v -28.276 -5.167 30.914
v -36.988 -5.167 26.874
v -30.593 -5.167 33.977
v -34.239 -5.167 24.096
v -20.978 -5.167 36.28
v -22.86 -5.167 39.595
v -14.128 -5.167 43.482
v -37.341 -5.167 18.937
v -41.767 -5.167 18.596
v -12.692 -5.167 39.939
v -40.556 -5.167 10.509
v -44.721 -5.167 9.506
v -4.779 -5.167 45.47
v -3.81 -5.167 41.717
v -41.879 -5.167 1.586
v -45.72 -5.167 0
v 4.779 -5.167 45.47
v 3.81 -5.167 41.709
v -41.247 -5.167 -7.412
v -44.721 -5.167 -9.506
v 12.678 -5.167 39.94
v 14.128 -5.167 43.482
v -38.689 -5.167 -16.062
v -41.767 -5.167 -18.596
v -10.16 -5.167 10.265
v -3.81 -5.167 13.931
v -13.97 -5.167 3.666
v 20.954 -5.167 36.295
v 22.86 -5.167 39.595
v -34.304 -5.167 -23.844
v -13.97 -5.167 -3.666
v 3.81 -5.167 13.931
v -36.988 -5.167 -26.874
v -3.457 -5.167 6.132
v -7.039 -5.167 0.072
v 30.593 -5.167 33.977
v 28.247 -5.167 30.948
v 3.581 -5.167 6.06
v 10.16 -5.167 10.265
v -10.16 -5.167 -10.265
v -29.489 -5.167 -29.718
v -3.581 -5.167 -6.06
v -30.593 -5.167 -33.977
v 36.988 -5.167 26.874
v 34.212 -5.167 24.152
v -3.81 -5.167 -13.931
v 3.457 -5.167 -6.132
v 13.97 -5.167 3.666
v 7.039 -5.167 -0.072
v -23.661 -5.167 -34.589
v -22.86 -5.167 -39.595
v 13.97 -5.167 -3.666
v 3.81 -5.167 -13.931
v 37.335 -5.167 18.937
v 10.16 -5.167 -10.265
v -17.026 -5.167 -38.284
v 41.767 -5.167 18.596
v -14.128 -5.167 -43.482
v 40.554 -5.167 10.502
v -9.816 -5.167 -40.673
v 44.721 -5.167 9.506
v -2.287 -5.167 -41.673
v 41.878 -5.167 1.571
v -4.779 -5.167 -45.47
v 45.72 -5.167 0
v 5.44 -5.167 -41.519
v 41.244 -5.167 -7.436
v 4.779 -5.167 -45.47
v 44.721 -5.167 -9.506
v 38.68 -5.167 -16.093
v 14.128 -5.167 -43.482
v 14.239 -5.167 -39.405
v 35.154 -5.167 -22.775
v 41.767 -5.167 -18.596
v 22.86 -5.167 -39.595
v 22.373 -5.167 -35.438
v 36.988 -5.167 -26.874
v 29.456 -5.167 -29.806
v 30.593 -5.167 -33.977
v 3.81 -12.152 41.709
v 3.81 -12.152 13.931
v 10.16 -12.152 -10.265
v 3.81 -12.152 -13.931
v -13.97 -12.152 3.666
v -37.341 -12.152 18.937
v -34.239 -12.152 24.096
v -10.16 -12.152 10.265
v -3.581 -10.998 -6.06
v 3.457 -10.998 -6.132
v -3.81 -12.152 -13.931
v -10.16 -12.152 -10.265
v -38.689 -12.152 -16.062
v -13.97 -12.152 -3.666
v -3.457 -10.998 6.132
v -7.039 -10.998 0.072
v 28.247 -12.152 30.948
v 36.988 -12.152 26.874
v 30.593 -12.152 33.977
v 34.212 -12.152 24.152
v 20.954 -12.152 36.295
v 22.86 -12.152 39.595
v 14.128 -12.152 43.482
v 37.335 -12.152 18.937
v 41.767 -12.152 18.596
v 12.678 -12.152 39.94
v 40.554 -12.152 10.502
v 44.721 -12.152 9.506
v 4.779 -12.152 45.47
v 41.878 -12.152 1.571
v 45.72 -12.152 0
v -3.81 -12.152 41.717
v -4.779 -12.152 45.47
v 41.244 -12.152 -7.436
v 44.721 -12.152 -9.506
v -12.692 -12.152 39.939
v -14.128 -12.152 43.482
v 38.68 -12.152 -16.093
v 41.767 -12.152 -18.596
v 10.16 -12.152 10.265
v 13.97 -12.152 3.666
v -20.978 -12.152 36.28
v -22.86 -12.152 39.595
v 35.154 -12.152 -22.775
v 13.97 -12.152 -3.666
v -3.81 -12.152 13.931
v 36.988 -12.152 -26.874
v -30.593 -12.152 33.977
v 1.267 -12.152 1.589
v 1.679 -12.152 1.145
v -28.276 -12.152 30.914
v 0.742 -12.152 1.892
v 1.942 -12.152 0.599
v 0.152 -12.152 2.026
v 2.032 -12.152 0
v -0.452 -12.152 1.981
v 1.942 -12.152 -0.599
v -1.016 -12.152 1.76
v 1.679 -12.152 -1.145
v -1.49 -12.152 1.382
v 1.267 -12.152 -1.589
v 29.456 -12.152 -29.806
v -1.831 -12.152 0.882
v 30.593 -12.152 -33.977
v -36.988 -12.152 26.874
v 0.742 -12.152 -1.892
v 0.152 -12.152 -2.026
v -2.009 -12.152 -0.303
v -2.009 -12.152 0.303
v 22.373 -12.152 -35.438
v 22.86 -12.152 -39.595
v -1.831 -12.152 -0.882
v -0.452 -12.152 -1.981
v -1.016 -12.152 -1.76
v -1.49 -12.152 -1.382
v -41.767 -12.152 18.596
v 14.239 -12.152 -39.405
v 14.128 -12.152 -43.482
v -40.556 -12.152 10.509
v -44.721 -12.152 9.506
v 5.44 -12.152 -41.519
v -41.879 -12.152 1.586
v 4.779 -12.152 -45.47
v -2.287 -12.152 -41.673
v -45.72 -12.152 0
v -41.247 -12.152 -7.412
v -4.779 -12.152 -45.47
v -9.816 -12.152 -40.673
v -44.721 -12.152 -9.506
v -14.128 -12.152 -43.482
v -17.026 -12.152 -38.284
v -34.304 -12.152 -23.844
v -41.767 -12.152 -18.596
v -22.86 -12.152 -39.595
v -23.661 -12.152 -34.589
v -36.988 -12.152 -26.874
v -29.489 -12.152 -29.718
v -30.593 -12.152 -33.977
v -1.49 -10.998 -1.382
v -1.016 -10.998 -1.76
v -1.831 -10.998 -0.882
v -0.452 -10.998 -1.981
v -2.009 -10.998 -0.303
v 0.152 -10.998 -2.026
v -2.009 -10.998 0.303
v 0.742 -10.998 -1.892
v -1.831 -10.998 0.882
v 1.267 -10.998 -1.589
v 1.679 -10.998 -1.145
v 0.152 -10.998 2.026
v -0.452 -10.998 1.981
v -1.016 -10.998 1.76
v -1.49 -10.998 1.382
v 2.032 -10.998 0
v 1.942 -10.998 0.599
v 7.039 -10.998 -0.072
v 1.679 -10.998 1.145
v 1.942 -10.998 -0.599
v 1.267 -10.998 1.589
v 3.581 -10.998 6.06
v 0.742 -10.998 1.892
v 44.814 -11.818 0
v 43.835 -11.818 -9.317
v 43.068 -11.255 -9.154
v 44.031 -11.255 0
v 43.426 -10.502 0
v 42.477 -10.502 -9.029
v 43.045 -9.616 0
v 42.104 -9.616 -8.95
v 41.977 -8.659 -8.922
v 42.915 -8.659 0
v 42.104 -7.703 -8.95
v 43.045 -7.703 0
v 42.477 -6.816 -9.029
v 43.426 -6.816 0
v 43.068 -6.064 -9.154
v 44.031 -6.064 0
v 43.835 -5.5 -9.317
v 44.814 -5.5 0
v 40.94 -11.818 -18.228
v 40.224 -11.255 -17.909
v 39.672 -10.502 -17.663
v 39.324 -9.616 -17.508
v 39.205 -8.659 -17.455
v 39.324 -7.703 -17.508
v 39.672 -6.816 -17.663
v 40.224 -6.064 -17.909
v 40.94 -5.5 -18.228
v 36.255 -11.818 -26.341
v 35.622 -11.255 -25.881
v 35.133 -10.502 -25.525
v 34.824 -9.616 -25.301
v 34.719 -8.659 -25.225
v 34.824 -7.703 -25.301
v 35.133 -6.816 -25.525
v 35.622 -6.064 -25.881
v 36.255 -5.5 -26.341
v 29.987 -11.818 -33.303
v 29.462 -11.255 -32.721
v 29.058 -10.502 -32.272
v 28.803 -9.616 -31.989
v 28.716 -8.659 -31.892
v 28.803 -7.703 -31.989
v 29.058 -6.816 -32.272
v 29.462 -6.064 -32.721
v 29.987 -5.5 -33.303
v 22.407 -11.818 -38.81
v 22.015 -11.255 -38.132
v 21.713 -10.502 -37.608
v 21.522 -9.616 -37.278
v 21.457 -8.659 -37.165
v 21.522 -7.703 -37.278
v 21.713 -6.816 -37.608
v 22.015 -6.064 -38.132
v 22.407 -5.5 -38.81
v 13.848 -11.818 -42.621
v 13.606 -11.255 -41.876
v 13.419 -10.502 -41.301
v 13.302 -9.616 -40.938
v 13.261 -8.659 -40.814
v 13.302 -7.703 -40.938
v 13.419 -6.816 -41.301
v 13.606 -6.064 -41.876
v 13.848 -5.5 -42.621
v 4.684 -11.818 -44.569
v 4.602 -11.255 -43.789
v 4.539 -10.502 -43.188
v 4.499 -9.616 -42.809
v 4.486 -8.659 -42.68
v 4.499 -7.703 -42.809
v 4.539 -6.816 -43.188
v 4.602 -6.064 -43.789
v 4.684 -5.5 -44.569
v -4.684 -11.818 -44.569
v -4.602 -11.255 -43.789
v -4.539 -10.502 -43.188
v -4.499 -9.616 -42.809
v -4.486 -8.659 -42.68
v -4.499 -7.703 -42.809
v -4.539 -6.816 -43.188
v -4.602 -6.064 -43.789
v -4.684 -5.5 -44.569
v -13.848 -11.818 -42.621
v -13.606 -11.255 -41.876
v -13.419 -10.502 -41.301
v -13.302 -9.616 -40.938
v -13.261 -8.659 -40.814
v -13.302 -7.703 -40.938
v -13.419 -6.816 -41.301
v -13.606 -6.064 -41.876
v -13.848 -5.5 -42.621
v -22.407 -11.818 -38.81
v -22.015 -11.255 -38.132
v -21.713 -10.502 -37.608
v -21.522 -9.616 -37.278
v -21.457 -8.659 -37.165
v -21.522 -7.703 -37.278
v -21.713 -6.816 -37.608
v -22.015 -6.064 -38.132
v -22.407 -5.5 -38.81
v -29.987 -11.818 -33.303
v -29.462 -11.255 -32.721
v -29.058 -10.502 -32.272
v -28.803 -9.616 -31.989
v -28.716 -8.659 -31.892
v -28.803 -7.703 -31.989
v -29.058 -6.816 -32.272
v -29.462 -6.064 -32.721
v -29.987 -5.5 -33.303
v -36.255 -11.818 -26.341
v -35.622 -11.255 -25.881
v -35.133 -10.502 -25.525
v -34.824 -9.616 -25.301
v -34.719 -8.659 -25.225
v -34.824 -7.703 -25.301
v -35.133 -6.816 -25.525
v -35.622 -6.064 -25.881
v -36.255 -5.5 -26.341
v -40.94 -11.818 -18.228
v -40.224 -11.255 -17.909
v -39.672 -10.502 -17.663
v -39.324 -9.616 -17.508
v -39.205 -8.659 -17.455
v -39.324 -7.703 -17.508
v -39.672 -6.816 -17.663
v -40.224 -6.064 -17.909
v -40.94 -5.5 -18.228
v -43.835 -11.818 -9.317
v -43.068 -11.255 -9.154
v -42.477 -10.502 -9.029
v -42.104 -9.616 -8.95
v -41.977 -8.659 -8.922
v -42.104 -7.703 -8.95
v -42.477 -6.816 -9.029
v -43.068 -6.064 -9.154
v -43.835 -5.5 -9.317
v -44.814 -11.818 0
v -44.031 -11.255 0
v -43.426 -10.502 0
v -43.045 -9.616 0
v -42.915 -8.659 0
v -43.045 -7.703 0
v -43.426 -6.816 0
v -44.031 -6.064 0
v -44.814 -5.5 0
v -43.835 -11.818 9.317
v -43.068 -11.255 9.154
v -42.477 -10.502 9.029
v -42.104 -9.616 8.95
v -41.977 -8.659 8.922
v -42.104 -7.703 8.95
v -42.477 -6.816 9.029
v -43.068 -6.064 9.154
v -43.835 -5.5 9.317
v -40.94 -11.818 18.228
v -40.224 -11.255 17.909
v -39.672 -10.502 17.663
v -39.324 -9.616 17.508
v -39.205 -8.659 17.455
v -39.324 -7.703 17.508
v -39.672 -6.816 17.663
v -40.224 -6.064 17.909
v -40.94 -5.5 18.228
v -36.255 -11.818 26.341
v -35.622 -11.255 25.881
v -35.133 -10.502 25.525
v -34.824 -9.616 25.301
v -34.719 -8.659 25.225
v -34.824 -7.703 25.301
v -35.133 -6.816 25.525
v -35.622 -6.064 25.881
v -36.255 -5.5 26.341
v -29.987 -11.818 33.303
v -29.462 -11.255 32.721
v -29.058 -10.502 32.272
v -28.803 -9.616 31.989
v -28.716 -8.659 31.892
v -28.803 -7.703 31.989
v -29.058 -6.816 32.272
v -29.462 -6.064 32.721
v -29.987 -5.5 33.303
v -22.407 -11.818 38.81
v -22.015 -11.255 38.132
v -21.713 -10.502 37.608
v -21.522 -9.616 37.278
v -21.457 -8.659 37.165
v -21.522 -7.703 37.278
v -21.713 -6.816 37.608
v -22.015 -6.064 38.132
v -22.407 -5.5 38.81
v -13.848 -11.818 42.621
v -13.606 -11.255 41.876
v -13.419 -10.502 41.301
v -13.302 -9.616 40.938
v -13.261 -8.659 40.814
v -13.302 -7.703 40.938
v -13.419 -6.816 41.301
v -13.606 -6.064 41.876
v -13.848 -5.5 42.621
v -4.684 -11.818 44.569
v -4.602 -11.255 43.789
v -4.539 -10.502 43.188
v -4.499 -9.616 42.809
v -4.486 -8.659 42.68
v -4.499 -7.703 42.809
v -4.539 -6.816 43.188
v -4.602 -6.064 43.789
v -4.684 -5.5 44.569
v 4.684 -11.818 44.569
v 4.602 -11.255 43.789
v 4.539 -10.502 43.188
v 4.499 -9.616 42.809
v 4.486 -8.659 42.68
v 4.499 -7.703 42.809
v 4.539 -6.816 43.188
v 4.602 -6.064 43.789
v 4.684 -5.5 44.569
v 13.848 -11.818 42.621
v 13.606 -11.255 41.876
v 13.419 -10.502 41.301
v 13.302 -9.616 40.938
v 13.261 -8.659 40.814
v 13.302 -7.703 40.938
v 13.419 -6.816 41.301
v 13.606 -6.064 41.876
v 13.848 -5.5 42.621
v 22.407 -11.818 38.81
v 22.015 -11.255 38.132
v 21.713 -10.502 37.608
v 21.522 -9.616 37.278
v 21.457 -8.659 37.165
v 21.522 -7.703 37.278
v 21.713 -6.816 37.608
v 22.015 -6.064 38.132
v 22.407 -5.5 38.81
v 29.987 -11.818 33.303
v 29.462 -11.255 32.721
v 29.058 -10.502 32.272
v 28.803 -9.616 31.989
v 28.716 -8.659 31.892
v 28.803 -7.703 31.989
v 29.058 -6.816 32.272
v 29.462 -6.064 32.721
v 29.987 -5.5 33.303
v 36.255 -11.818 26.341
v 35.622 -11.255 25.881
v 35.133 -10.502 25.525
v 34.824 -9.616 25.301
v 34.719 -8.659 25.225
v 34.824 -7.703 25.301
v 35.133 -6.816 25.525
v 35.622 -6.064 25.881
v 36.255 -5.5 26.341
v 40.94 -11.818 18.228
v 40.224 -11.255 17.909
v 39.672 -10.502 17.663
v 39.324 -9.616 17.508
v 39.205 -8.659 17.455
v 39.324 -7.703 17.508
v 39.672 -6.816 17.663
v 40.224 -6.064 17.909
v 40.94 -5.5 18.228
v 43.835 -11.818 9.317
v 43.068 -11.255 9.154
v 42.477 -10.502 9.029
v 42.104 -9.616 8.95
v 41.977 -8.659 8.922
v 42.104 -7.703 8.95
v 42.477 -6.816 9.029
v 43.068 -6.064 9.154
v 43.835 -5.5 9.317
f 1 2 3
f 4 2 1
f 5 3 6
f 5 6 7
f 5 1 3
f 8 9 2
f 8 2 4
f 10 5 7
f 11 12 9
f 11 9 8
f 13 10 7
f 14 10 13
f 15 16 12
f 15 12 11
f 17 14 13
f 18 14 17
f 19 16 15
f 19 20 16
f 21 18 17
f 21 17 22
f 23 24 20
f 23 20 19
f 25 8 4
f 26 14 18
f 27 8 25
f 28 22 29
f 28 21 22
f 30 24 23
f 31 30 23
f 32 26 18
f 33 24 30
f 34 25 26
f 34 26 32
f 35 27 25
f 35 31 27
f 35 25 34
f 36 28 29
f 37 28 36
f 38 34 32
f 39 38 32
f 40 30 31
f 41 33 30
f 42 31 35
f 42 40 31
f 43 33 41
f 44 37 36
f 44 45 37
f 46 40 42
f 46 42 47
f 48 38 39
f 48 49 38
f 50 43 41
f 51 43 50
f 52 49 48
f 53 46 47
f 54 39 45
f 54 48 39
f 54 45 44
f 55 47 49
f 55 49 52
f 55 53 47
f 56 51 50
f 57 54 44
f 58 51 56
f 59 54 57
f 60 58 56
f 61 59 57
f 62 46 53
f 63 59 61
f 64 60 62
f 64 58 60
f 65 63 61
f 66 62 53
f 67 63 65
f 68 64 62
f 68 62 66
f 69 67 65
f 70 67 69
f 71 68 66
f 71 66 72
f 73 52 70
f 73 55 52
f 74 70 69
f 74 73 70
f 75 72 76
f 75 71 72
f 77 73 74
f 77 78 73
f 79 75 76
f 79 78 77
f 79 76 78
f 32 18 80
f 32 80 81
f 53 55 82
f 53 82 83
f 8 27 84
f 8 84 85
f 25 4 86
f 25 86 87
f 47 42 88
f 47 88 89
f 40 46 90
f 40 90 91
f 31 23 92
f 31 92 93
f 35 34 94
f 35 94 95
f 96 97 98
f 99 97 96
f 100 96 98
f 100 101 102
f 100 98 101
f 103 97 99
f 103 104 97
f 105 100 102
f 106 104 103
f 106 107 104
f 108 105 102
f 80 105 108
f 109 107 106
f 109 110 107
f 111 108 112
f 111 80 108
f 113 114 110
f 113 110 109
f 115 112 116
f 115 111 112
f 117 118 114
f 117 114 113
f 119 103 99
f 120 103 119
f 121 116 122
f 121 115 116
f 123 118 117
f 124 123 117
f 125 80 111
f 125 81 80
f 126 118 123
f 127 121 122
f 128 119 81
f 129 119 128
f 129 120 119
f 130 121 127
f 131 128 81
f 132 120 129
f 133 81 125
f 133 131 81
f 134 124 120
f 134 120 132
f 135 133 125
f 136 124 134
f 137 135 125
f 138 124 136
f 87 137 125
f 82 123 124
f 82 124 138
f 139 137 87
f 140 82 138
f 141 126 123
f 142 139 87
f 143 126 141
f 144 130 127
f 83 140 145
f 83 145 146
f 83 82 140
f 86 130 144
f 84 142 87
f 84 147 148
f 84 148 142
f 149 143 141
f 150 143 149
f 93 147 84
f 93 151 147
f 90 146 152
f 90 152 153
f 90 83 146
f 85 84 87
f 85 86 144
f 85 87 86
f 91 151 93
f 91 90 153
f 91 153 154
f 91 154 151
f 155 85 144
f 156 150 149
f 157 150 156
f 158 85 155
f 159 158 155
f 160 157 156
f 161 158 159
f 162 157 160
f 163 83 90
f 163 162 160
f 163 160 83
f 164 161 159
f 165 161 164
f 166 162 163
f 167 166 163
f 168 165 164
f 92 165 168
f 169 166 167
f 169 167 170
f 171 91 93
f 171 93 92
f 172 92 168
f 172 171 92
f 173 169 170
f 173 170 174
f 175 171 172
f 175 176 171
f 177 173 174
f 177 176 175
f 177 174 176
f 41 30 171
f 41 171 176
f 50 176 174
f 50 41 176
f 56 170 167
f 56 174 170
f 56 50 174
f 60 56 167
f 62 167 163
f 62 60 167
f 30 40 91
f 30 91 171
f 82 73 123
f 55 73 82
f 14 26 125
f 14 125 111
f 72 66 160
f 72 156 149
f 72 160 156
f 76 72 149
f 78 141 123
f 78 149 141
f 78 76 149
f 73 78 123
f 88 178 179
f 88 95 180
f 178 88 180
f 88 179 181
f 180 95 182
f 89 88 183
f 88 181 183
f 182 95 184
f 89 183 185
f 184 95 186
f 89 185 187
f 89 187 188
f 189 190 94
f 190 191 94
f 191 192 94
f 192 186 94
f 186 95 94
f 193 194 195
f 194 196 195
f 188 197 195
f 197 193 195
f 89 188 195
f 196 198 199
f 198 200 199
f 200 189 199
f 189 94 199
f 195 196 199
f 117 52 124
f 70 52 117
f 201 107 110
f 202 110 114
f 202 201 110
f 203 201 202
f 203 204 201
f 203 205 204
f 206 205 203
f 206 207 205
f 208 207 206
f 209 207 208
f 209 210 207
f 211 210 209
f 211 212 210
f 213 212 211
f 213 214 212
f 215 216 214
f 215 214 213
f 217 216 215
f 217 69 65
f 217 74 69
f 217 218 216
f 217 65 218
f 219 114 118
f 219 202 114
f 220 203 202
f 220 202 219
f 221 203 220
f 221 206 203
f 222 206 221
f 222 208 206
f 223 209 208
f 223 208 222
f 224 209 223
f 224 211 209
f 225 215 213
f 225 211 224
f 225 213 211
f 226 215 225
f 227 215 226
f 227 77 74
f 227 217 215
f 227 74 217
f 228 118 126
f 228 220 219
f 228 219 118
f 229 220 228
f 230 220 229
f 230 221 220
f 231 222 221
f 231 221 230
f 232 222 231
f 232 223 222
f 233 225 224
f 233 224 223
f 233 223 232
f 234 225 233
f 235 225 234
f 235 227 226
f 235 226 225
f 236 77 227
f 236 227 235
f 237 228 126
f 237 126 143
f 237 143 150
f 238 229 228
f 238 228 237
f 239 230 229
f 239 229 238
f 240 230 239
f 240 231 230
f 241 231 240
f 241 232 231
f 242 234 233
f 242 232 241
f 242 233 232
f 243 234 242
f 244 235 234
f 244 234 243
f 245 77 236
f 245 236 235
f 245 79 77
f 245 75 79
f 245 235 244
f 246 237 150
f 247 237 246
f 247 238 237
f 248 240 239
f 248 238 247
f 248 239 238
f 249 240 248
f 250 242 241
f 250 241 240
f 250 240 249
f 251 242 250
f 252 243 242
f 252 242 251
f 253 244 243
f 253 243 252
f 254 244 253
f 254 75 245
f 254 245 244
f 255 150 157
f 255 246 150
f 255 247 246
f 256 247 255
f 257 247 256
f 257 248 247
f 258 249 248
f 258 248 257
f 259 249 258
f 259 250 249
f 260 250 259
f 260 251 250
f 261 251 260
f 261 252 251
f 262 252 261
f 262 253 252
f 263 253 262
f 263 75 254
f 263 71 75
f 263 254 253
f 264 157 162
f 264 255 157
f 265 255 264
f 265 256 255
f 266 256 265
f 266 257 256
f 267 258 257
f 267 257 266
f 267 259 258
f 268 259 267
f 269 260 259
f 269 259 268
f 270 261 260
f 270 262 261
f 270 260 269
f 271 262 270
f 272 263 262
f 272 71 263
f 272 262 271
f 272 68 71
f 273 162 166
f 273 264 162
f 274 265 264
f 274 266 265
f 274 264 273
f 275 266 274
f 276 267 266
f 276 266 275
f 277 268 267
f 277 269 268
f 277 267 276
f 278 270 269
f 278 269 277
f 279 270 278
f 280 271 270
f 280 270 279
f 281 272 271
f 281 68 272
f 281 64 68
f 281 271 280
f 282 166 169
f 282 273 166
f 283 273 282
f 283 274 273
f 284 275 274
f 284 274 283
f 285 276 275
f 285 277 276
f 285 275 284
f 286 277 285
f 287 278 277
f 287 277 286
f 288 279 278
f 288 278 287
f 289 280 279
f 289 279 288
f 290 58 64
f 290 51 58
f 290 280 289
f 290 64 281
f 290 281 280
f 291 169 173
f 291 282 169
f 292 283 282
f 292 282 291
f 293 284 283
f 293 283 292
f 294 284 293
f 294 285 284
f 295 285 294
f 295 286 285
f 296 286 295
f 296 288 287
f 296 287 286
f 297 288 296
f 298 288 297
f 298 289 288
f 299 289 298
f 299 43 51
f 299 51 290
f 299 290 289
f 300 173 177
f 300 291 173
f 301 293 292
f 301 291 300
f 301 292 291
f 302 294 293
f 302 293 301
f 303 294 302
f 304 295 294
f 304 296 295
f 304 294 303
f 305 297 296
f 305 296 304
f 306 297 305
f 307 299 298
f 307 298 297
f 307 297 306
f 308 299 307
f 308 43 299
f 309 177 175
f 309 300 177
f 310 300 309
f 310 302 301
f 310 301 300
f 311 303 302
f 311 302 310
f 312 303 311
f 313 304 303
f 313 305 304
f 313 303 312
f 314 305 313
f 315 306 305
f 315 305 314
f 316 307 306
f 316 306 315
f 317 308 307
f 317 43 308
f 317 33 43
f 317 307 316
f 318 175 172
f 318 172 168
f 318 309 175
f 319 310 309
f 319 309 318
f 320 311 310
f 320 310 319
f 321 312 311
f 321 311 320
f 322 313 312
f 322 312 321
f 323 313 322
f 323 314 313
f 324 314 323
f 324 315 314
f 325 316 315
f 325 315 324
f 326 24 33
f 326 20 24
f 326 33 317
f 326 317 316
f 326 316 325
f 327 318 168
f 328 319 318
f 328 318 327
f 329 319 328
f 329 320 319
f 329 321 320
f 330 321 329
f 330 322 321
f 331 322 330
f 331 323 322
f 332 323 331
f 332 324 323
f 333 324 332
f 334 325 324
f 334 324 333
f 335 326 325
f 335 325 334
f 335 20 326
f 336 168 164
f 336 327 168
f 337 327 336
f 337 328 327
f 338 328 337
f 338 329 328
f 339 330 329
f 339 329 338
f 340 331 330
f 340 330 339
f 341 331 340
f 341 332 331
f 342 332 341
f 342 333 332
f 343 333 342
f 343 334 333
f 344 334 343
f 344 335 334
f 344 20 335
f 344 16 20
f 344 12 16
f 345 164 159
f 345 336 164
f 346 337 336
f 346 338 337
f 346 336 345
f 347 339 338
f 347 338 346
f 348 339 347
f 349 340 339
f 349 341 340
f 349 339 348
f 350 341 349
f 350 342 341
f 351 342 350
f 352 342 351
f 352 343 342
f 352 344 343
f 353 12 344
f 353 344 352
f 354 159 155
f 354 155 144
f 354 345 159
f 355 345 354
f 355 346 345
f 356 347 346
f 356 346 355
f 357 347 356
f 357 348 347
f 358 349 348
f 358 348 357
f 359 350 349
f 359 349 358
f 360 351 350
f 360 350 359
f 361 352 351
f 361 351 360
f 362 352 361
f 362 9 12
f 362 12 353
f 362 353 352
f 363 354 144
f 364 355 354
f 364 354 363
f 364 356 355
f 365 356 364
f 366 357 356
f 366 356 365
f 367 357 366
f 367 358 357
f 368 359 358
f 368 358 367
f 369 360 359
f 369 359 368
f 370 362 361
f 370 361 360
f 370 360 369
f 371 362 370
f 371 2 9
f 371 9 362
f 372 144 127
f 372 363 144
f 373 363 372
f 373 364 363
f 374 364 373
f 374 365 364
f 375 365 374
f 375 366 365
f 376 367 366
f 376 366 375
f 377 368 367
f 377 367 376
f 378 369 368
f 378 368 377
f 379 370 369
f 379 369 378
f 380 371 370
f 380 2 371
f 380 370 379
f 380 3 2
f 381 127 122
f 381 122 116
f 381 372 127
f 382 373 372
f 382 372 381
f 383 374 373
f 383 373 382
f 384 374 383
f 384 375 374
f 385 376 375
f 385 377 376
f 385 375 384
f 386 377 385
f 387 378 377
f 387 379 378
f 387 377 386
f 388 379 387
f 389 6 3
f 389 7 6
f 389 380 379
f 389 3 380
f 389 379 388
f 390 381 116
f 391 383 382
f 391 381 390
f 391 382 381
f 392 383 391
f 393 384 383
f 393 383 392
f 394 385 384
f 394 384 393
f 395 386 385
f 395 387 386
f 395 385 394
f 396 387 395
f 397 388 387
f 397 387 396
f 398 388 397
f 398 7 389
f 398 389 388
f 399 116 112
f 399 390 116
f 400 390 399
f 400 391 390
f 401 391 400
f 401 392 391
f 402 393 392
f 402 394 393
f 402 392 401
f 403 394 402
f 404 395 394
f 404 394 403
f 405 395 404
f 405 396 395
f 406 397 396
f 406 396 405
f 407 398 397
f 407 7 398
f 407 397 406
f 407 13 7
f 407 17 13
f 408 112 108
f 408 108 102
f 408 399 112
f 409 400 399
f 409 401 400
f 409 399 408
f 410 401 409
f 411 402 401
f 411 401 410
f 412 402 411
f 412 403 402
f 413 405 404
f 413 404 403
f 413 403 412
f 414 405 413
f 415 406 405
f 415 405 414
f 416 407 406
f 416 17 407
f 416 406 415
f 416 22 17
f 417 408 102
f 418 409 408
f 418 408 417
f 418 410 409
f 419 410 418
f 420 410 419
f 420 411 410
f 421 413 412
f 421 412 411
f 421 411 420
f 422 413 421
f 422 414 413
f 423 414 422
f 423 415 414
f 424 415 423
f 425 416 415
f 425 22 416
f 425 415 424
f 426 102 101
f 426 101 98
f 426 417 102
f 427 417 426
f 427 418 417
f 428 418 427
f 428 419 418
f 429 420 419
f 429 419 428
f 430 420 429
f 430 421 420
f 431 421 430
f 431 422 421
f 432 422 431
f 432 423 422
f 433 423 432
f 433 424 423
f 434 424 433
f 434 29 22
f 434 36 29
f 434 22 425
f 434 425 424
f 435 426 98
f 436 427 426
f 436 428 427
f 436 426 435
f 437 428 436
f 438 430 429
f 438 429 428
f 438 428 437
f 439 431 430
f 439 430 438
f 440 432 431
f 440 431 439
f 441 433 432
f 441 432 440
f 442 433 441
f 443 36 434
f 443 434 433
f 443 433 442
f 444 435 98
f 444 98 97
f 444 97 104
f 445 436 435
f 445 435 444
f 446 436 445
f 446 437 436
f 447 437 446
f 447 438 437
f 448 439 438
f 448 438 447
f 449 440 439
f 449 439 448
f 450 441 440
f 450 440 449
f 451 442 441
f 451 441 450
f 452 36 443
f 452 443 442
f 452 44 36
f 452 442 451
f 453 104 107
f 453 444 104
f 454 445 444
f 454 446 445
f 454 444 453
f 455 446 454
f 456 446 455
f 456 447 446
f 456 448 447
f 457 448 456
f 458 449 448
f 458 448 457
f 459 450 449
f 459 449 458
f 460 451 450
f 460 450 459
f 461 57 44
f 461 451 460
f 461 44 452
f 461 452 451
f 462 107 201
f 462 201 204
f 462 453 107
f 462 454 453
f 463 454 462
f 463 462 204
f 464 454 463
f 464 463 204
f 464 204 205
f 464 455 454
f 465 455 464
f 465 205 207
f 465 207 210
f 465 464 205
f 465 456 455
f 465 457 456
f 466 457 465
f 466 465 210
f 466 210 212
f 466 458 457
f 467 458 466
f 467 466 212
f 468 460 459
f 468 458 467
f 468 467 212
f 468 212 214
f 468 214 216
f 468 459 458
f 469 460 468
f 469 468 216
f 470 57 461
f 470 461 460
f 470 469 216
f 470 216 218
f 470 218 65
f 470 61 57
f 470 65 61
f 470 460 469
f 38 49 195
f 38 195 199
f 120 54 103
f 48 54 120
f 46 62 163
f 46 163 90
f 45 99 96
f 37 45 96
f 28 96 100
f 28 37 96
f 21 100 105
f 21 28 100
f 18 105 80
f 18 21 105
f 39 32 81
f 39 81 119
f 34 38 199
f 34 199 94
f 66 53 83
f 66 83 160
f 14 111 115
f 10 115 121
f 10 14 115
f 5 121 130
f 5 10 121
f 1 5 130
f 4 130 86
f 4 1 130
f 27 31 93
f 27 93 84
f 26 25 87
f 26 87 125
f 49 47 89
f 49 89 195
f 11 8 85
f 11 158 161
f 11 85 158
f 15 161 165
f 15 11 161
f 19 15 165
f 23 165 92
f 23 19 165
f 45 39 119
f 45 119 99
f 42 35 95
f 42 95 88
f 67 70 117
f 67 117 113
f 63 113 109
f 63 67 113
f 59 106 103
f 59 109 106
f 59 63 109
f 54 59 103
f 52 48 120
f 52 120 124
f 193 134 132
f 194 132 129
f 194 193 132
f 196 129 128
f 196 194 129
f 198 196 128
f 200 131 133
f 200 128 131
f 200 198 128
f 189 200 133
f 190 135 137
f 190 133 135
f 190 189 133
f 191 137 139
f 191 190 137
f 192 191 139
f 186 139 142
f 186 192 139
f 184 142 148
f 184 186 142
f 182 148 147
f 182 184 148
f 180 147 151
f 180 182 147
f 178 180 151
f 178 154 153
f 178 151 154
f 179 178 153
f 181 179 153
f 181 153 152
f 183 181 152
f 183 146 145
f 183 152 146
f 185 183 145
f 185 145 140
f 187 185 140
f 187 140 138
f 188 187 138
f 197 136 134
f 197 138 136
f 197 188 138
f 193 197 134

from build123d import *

# Parameters (mm, degrees)
F2_R     = 2.032
F3_DEPTH = 15.875
F4_DEPTH = 10.9982


# Not quite as in the source:
# - a feature names something its author has since deleted; it is built from what else it names


with BuildPart() as f1:
    # F0 (on Top) → F1 (revolve)
    with BuildSketch(Plane.XY):
        with BuildLine():
            Line((0, -5.1666409709), (0, -12.1516409709))
            Line((0, -12.1516409709), (45.72, -12.1516409709))
            ThreePointArc((45.72, -12.1516409709), (42.9147529825, -8.6591409709), (45.72, -5.1666409709))
            Line((45.72, -5.1666409709), (0, -5.1666409709))
        make_face()
    revolve(axis=Axis((0, -8.561744864, 0), (0, 1, 0)))

    # F2 (on Front) → F3 (cut)
    with BuildSketch(Plane.XZ):
        with BuildLine():
            Line((13.97, 3.6661742094), (13.97, -3.6661742094))
            Line((13.97, -3.6661742094), (38.6802071591, -16.0932599922))
            ThreePointArc((38.6802071591, -16.0932599922), (41.8782799617, 1.5705660984), (37.3345500424, 18.9369975174))
            Line((37.3345500424, 18.9369975174), (13.97, 3.6661742094))
        make_face()
        with BuildLine():
            Line((3.81, 41.7094333604), (3.81, 13.9314619955))
            Line((3.81, 13.9314619955), (10.16, 10.2652877862))
            Line((10.16, 10.2652877862), (34.2119266748, 24.1516741264))
            ThreePointArc((34.2119266748, 24.1516741264), (20.9542761873, 36.2954737188), (3.81, 41.7094333604))
        make_face()
        with BuildLine():
            Line((-34.2388233597, 24.0958361272), (-10.16, 10.2652877862))
            Line((-10.16, 10.2652877862), (-3.81, 13.9314619955))
            Line((-3.81, 13.9314619955), (-3.81, 41.7173788368))
            ThreePointArc((-3.81, 41.7173788368), (-20.9781685322, 36.2803485402), (-34.2388233597, 24.0958361272))
        make_face()
        with BuildLine():
            Line((-38.6893950171, -16.0623838358), (-13.97, -3.6661742094))
            Line((-13.97, -3.6661742094), (-13.97, 3.6661742094))
            Line((-13.97, 3.6661742094), (-37.3405062231, 18.9372899969))
            ThreePointArc((-37.3405062231, 18.9372899969), (-41.8787701809, 1.5863648371), (-38.6893950171, -16.0623838358))
        make_face()
        with BuildLine():
            Line((-3.81, -13.9314619955), (-10.16, -10.2652877862))
            Line((-10.16, -10.2652877862), (-34.3038742814, -23.844345572))
            ThreePointArc((-34.3038742814, -23.844345572), (-20.4303998238, -36.5921428083), (-2.2874128339, -41.6726596109))
            Line((-2.2874128339, -41.6726596109), (-3.81, -13.9314619955))
        make_face()
        with BuildLine():
            Line((10.16, -10.2652877862), (3.81, -13.9314619955))
            Line((3.81, -13.9314619955), (5.4400267393, -41.5192010913))
            ThreePointArc((5.4400267393, -41.5192010913), (22.3730839146, -35.4381883413), (35.1536490306, -22.7746857971))
            Line((35.1536490306, -22.7746857971), (10.16, -10.2652877862))
        make_face()
        Circle(F2_R)
    extrude(amount=F3_DEPTH, mode=Mode.SUBTRACT)

    # F2 (on Front) → F4 (cut)
    with BuildSketch(Plane.XZ):
        Polygon((-7.0386894402, 0.071686571), (-3.5814271117, -6.059840579), (3.4572623285, -6.1315271501), (7.0386894402, -0.071686571), (3.5814271117, 6.059840579), (-3.4572623285, 6.1315271501), align=None)
        Circle(F2_R, mode=Mode.SUBTRACT)
    extrude(amount=F4_DEPTH, mode=Mode.SUBTRACT)


solid = f1.part
